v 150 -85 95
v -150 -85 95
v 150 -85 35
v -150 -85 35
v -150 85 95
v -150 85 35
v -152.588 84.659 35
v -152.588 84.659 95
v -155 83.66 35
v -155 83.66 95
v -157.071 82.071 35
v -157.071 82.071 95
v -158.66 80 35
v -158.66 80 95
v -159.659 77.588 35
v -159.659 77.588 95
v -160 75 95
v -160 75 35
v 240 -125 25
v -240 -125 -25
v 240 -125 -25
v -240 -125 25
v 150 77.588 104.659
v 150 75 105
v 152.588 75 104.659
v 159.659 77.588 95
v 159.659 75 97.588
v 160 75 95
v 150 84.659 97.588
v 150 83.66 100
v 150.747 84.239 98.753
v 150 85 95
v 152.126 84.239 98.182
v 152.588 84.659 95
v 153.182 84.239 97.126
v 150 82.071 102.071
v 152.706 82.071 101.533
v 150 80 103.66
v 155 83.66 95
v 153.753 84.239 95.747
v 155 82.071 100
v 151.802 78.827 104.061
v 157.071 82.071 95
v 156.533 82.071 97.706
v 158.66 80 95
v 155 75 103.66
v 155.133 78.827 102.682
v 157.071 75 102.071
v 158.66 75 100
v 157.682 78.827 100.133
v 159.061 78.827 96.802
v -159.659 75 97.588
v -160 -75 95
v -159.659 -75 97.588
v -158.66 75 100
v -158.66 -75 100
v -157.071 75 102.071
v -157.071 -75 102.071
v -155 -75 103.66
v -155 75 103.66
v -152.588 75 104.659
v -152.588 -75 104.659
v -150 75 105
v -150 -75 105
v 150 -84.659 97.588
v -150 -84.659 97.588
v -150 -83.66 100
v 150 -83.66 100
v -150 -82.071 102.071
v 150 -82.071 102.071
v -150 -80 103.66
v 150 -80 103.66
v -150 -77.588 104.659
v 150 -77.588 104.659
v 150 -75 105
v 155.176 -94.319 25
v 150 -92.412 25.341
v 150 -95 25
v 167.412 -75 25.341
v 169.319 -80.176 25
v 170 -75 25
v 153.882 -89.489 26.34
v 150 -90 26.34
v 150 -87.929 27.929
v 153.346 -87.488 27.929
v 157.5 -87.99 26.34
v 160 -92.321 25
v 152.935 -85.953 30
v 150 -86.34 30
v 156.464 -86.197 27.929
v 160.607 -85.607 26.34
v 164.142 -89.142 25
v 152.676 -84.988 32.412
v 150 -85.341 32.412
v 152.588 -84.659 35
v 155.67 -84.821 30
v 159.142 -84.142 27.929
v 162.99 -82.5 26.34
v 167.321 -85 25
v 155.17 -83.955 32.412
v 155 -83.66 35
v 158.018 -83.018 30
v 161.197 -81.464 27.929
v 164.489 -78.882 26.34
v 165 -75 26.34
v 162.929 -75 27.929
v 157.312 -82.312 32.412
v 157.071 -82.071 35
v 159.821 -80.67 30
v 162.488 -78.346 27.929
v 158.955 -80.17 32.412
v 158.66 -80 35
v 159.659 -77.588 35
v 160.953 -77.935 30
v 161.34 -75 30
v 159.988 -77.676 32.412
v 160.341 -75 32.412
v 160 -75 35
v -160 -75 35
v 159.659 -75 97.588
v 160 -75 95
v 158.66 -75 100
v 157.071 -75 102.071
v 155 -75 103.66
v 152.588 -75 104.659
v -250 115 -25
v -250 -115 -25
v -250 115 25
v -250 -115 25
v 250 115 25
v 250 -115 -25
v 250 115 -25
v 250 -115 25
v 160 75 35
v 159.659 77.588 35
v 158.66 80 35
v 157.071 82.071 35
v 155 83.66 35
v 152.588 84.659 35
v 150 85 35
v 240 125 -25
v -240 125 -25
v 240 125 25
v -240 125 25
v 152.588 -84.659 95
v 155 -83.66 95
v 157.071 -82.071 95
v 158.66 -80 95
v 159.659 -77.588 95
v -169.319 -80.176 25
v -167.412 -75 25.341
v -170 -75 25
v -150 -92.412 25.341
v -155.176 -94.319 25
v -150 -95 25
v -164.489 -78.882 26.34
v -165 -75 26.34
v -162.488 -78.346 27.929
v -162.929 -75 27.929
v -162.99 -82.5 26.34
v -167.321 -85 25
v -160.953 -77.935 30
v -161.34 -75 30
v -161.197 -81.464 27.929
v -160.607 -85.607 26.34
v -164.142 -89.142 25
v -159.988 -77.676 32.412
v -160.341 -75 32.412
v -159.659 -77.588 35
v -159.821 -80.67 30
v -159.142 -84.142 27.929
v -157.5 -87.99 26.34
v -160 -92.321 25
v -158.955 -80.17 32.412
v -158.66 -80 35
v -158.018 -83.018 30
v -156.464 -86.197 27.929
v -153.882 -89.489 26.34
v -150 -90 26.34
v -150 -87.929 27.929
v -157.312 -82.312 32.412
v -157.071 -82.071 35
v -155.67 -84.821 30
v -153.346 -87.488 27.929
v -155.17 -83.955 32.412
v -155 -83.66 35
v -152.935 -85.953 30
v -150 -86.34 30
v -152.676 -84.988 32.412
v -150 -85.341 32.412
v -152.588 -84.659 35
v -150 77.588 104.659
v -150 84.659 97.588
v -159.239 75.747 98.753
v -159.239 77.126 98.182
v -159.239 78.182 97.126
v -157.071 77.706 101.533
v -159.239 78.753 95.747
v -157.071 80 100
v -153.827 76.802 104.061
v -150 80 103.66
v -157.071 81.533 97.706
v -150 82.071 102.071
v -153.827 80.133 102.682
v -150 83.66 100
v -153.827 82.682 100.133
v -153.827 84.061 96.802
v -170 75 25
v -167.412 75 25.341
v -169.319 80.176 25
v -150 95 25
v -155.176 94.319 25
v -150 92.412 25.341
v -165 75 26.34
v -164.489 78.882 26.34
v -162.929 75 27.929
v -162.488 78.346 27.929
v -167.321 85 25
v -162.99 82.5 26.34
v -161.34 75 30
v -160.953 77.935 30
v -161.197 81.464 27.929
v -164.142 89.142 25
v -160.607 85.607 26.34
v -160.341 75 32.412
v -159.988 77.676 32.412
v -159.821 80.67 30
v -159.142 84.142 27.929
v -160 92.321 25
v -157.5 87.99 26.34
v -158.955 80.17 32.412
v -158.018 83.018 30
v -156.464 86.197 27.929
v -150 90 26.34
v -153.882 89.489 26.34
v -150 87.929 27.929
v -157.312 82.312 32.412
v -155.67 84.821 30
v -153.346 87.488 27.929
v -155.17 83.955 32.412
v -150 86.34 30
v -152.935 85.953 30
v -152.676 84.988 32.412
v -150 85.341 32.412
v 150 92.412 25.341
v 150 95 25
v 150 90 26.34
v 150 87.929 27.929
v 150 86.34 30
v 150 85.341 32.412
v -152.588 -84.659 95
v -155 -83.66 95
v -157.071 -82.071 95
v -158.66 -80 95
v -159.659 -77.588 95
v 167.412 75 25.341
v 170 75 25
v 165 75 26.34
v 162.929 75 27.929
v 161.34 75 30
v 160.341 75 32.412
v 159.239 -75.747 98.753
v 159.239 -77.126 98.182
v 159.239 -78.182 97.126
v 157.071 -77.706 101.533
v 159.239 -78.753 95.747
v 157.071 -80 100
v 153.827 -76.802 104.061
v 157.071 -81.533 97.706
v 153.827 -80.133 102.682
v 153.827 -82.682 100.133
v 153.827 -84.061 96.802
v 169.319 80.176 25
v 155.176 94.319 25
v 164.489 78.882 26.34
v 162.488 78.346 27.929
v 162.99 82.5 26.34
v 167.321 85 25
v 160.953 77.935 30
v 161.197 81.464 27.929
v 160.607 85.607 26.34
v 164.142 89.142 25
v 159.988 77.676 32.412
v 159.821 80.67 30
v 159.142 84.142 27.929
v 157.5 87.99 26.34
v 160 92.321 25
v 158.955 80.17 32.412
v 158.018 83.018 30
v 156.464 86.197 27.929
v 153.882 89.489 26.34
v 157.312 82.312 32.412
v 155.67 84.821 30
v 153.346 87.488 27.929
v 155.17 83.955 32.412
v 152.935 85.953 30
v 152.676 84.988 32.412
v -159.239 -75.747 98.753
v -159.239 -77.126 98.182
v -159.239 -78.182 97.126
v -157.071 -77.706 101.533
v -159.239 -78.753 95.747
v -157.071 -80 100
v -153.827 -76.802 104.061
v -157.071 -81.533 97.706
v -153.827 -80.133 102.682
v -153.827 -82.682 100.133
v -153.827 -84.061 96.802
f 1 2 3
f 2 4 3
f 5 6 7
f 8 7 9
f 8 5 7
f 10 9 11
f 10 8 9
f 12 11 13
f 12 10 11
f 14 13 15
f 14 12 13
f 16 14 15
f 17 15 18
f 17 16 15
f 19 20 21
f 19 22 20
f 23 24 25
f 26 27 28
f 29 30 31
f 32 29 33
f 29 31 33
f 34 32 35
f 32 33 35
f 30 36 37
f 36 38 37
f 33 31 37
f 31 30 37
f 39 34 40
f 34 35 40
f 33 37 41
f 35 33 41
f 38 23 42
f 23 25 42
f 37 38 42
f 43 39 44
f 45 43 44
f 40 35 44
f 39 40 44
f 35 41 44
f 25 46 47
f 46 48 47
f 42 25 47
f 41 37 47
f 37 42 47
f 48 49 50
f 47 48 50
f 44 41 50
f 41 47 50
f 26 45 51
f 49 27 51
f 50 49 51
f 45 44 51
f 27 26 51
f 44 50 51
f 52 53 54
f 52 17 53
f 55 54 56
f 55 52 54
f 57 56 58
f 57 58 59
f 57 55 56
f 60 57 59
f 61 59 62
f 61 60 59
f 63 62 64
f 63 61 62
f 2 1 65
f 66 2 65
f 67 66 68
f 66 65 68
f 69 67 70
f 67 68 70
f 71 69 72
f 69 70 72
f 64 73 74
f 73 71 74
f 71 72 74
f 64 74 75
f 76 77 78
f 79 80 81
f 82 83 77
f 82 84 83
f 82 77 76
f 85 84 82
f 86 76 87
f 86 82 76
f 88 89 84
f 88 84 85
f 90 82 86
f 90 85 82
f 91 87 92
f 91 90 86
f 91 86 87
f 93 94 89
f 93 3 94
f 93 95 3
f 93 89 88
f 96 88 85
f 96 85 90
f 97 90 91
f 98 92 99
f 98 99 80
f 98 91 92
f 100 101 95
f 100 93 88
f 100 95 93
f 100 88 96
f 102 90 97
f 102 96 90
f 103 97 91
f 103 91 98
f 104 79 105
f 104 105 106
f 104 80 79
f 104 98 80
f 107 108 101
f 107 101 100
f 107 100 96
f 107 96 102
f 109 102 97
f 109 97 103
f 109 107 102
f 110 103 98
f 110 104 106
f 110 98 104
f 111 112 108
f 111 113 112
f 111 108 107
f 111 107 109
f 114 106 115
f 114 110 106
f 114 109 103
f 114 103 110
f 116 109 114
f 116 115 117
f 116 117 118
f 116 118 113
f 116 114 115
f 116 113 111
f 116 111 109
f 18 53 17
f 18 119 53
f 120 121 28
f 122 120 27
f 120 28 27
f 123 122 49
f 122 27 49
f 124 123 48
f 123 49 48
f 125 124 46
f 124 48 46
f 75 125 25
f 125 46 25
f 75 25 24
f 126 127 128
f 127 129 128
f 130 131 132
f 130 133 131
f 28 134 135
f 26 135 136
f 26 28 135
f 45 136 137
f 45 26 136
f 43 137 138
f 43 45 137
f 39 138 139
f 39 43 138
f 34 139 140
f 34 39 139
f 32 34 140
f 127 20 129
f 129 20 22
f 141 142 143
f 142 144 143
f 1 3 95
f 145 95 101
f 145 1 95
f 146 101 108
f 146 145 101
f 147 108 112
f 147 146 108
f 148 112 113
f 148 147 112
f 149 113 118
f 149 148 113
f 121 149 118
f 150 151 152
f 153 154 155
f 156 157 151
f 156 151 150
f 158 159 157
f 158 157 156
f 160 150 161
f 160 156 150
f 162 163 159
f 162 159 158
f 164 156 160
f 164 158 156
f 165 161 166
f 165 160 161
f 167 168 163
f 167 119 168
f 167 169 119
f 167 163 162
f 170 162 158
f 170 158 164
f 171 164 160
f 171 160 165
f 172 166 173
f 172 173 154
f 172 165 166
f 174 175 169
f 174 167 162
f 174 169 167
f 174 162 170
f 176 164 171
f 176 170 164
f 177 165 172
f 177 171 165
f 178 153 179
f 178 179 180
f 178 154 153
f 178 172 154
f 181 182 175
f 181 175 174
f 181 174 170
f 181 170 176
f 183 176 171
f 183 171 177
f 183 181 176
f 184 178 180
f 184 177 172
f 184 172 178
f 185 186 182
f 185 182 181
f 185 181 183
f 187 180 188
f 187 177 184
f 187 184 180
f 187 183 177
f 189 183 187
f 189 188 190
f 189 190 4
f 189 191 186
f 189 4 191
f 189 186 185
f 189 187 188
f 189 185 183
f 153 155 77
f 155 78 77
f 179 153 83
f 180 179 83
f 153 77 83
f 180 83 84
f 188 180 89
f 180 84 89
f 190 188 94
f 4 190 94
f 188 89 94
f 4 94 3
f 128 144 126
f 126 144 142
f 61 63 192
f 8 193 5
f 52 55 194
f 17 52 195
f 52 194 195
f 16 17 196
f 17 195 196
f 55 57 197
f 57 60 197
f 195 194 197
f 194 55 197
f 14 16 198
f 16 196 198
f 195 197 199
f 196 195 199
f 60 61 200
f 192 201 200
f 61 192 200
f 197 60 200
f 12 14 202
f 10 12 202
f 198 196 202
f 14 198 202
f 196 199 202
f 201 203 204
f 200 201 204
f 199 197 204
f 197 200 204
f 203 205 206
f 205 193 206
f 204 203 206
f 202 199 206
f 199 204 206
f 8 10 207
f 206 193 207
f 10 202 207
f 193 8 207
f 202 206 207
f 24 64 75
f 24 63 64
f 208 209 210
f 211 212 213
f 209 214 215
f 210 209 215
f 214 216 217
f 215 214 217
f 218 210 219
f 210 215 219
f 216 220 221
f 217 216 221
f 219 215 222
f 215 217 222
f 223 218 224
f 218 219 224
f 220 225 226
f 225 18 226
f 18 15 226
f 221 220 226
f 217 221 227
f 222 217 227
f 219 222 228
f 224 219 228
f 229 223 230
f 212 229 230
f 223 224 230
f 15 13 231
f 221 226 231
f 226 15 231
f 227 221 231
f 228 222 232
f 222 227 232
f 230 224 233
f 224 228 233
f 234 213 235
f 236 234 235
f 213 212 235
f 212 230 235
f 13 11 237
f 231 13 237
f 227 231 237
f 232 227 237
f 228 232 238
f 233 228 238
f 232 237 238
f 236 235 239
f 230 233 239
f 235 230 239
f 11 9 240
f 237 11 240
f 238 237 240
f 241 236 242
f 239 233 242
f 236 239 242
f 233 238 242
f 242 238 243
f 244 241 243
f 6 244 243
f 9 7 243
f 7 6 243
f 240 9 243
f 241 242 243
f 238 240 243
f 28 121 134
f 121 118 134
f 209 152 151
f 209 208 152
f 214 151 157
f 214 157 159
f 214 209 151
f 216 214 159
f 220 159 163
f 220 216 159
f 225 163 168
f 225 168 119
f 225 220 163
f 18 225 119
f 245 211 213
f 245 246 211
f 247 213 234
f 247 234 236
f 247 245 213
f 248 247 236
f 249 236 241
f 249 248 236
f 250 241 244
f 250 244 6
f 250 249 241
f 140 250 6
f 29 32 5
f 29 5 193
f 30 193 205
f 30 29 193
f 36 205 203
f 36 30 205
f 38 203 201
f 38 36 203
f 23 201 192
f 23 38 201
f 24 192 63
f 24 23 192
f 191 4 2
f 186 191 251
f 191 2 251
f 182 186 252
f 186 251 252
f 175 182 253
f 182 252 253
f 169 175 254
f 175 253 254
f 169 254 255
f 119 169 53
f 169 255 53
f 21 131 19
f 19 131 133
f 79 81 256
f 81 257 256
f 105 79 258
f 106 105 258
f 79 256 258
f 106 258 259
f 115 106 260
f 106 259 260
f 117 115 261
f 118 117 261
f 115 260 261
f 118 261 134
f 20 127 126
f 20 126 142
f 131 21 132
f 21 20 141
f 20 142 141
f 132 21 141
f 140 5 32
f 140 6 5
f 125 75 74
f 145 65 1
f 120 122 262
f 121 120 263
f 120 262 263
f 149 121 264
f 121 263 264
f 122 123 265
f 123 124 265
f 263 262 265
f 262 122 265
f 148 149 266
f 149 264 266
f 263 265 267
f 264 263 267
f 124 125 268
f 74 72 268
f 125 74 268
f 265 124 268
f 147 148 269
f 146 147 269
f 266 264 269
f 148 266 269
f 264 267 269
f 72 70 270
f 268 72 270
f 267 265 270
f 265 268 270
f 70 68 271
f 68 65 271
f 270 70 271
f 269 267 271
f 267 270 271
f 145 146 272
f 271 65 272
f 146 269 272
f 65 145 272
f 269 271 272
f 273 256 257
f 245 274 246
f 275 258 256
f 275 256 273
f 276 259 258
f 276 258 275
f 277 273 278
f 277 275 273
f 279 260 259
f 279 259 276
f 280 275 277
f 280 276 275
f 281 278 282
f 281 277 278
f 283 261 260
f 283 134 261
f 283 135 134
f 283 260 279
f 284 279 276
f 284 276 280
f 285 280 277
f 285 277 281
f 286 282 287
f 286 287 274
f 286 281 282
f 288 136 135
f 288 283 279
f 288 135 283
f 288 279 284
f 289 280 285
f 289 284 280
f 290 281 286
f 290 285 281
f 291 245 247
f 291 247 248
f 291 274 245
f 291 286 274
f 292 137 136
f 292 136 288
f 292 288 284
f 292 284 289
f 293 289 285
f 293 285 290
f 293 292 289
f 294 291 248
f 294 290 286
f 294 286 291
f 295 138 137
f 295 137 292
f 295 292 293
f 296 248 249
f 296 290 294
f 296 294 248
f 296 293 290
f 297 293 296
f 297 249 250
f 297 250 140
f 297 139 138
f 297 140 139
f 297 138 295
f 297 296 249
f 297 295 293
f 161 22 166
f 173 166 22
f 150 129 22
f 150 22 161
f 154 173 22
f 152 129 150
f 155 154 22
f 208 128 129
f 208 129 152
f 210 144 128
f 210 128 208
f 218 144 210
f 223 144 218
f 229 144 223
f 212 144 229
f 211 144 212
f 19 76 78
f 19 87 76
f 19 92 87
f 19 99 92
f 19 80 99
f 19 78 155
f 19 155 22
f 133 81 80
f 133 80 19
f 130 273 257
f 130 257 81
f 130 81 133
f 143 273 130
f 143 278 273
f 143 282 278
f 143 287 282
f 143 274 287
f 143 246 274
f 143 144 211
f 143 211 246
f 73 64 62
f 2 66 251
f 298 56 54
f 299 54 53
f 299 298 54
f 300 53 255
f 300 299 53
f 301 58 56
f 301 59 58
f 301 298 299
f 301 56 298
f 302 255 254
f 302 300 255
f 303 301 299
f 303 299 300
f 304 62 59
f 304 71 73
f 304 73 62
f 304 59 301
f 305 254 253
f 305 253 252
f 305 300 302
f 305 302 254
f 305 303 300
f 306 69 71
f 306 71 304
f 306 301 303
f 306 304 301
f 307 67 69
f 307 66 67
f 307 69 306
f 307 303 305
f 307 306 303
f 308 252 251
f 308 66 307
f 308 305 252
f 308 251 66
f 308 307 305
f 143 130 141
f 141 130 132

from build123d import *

# Parameters (mm, degrees)
F0_W     = 500
F0_H     = 250
F1_DEPTH = 25
F2_W     = 320
F2_H     = 170
F3_DEPTH = 80
F4_R     = 10
F5_SIZE  = 10


with BuildPart() as f1:
    # F0 (on Top) → F1 (new body, symmetric)
    with BuildSketch(Plane.XY):
        Rectangle(F0_W, F0_H)
    extrude(amount=F1_DEPTH, both=True)

    # F2 (on face) → F3 (join)
    with BuildSketch(Plane.XY.offset(25)):
        Rectangle(F2_W, F2_H)
    extrude(amount=F3_DEPTH)

    # F4
    f4_edges = [f1.edges().sort_by_distance(p)[0] for p in [
        (0, -85, 105),
        (160, 0, 105),
        (0, 85, 105),
        (-160, 0, 105),
        (-160, -85, 65),
        (160, -85, 65),
        (160, 85, 65),
        (-160, 85, 65),
        (-160, 0, 25),
        (0, -85, 25),
        (160, 0, 25),
        (0, 85, 25),
    ]]
    fillet(f4_edges, radius=F4_R)

    # F5
    f5_edges = [f1.edges().sort_by_distance(p)[0] for p in [
        (-250, -125, 0),
        (-250, 125, 0),
        (250, 125, 0),
        (250, -125, 0),
    ]]
    chamfer(f5_edges, length=F5_SIZE)


solid = f1.part
